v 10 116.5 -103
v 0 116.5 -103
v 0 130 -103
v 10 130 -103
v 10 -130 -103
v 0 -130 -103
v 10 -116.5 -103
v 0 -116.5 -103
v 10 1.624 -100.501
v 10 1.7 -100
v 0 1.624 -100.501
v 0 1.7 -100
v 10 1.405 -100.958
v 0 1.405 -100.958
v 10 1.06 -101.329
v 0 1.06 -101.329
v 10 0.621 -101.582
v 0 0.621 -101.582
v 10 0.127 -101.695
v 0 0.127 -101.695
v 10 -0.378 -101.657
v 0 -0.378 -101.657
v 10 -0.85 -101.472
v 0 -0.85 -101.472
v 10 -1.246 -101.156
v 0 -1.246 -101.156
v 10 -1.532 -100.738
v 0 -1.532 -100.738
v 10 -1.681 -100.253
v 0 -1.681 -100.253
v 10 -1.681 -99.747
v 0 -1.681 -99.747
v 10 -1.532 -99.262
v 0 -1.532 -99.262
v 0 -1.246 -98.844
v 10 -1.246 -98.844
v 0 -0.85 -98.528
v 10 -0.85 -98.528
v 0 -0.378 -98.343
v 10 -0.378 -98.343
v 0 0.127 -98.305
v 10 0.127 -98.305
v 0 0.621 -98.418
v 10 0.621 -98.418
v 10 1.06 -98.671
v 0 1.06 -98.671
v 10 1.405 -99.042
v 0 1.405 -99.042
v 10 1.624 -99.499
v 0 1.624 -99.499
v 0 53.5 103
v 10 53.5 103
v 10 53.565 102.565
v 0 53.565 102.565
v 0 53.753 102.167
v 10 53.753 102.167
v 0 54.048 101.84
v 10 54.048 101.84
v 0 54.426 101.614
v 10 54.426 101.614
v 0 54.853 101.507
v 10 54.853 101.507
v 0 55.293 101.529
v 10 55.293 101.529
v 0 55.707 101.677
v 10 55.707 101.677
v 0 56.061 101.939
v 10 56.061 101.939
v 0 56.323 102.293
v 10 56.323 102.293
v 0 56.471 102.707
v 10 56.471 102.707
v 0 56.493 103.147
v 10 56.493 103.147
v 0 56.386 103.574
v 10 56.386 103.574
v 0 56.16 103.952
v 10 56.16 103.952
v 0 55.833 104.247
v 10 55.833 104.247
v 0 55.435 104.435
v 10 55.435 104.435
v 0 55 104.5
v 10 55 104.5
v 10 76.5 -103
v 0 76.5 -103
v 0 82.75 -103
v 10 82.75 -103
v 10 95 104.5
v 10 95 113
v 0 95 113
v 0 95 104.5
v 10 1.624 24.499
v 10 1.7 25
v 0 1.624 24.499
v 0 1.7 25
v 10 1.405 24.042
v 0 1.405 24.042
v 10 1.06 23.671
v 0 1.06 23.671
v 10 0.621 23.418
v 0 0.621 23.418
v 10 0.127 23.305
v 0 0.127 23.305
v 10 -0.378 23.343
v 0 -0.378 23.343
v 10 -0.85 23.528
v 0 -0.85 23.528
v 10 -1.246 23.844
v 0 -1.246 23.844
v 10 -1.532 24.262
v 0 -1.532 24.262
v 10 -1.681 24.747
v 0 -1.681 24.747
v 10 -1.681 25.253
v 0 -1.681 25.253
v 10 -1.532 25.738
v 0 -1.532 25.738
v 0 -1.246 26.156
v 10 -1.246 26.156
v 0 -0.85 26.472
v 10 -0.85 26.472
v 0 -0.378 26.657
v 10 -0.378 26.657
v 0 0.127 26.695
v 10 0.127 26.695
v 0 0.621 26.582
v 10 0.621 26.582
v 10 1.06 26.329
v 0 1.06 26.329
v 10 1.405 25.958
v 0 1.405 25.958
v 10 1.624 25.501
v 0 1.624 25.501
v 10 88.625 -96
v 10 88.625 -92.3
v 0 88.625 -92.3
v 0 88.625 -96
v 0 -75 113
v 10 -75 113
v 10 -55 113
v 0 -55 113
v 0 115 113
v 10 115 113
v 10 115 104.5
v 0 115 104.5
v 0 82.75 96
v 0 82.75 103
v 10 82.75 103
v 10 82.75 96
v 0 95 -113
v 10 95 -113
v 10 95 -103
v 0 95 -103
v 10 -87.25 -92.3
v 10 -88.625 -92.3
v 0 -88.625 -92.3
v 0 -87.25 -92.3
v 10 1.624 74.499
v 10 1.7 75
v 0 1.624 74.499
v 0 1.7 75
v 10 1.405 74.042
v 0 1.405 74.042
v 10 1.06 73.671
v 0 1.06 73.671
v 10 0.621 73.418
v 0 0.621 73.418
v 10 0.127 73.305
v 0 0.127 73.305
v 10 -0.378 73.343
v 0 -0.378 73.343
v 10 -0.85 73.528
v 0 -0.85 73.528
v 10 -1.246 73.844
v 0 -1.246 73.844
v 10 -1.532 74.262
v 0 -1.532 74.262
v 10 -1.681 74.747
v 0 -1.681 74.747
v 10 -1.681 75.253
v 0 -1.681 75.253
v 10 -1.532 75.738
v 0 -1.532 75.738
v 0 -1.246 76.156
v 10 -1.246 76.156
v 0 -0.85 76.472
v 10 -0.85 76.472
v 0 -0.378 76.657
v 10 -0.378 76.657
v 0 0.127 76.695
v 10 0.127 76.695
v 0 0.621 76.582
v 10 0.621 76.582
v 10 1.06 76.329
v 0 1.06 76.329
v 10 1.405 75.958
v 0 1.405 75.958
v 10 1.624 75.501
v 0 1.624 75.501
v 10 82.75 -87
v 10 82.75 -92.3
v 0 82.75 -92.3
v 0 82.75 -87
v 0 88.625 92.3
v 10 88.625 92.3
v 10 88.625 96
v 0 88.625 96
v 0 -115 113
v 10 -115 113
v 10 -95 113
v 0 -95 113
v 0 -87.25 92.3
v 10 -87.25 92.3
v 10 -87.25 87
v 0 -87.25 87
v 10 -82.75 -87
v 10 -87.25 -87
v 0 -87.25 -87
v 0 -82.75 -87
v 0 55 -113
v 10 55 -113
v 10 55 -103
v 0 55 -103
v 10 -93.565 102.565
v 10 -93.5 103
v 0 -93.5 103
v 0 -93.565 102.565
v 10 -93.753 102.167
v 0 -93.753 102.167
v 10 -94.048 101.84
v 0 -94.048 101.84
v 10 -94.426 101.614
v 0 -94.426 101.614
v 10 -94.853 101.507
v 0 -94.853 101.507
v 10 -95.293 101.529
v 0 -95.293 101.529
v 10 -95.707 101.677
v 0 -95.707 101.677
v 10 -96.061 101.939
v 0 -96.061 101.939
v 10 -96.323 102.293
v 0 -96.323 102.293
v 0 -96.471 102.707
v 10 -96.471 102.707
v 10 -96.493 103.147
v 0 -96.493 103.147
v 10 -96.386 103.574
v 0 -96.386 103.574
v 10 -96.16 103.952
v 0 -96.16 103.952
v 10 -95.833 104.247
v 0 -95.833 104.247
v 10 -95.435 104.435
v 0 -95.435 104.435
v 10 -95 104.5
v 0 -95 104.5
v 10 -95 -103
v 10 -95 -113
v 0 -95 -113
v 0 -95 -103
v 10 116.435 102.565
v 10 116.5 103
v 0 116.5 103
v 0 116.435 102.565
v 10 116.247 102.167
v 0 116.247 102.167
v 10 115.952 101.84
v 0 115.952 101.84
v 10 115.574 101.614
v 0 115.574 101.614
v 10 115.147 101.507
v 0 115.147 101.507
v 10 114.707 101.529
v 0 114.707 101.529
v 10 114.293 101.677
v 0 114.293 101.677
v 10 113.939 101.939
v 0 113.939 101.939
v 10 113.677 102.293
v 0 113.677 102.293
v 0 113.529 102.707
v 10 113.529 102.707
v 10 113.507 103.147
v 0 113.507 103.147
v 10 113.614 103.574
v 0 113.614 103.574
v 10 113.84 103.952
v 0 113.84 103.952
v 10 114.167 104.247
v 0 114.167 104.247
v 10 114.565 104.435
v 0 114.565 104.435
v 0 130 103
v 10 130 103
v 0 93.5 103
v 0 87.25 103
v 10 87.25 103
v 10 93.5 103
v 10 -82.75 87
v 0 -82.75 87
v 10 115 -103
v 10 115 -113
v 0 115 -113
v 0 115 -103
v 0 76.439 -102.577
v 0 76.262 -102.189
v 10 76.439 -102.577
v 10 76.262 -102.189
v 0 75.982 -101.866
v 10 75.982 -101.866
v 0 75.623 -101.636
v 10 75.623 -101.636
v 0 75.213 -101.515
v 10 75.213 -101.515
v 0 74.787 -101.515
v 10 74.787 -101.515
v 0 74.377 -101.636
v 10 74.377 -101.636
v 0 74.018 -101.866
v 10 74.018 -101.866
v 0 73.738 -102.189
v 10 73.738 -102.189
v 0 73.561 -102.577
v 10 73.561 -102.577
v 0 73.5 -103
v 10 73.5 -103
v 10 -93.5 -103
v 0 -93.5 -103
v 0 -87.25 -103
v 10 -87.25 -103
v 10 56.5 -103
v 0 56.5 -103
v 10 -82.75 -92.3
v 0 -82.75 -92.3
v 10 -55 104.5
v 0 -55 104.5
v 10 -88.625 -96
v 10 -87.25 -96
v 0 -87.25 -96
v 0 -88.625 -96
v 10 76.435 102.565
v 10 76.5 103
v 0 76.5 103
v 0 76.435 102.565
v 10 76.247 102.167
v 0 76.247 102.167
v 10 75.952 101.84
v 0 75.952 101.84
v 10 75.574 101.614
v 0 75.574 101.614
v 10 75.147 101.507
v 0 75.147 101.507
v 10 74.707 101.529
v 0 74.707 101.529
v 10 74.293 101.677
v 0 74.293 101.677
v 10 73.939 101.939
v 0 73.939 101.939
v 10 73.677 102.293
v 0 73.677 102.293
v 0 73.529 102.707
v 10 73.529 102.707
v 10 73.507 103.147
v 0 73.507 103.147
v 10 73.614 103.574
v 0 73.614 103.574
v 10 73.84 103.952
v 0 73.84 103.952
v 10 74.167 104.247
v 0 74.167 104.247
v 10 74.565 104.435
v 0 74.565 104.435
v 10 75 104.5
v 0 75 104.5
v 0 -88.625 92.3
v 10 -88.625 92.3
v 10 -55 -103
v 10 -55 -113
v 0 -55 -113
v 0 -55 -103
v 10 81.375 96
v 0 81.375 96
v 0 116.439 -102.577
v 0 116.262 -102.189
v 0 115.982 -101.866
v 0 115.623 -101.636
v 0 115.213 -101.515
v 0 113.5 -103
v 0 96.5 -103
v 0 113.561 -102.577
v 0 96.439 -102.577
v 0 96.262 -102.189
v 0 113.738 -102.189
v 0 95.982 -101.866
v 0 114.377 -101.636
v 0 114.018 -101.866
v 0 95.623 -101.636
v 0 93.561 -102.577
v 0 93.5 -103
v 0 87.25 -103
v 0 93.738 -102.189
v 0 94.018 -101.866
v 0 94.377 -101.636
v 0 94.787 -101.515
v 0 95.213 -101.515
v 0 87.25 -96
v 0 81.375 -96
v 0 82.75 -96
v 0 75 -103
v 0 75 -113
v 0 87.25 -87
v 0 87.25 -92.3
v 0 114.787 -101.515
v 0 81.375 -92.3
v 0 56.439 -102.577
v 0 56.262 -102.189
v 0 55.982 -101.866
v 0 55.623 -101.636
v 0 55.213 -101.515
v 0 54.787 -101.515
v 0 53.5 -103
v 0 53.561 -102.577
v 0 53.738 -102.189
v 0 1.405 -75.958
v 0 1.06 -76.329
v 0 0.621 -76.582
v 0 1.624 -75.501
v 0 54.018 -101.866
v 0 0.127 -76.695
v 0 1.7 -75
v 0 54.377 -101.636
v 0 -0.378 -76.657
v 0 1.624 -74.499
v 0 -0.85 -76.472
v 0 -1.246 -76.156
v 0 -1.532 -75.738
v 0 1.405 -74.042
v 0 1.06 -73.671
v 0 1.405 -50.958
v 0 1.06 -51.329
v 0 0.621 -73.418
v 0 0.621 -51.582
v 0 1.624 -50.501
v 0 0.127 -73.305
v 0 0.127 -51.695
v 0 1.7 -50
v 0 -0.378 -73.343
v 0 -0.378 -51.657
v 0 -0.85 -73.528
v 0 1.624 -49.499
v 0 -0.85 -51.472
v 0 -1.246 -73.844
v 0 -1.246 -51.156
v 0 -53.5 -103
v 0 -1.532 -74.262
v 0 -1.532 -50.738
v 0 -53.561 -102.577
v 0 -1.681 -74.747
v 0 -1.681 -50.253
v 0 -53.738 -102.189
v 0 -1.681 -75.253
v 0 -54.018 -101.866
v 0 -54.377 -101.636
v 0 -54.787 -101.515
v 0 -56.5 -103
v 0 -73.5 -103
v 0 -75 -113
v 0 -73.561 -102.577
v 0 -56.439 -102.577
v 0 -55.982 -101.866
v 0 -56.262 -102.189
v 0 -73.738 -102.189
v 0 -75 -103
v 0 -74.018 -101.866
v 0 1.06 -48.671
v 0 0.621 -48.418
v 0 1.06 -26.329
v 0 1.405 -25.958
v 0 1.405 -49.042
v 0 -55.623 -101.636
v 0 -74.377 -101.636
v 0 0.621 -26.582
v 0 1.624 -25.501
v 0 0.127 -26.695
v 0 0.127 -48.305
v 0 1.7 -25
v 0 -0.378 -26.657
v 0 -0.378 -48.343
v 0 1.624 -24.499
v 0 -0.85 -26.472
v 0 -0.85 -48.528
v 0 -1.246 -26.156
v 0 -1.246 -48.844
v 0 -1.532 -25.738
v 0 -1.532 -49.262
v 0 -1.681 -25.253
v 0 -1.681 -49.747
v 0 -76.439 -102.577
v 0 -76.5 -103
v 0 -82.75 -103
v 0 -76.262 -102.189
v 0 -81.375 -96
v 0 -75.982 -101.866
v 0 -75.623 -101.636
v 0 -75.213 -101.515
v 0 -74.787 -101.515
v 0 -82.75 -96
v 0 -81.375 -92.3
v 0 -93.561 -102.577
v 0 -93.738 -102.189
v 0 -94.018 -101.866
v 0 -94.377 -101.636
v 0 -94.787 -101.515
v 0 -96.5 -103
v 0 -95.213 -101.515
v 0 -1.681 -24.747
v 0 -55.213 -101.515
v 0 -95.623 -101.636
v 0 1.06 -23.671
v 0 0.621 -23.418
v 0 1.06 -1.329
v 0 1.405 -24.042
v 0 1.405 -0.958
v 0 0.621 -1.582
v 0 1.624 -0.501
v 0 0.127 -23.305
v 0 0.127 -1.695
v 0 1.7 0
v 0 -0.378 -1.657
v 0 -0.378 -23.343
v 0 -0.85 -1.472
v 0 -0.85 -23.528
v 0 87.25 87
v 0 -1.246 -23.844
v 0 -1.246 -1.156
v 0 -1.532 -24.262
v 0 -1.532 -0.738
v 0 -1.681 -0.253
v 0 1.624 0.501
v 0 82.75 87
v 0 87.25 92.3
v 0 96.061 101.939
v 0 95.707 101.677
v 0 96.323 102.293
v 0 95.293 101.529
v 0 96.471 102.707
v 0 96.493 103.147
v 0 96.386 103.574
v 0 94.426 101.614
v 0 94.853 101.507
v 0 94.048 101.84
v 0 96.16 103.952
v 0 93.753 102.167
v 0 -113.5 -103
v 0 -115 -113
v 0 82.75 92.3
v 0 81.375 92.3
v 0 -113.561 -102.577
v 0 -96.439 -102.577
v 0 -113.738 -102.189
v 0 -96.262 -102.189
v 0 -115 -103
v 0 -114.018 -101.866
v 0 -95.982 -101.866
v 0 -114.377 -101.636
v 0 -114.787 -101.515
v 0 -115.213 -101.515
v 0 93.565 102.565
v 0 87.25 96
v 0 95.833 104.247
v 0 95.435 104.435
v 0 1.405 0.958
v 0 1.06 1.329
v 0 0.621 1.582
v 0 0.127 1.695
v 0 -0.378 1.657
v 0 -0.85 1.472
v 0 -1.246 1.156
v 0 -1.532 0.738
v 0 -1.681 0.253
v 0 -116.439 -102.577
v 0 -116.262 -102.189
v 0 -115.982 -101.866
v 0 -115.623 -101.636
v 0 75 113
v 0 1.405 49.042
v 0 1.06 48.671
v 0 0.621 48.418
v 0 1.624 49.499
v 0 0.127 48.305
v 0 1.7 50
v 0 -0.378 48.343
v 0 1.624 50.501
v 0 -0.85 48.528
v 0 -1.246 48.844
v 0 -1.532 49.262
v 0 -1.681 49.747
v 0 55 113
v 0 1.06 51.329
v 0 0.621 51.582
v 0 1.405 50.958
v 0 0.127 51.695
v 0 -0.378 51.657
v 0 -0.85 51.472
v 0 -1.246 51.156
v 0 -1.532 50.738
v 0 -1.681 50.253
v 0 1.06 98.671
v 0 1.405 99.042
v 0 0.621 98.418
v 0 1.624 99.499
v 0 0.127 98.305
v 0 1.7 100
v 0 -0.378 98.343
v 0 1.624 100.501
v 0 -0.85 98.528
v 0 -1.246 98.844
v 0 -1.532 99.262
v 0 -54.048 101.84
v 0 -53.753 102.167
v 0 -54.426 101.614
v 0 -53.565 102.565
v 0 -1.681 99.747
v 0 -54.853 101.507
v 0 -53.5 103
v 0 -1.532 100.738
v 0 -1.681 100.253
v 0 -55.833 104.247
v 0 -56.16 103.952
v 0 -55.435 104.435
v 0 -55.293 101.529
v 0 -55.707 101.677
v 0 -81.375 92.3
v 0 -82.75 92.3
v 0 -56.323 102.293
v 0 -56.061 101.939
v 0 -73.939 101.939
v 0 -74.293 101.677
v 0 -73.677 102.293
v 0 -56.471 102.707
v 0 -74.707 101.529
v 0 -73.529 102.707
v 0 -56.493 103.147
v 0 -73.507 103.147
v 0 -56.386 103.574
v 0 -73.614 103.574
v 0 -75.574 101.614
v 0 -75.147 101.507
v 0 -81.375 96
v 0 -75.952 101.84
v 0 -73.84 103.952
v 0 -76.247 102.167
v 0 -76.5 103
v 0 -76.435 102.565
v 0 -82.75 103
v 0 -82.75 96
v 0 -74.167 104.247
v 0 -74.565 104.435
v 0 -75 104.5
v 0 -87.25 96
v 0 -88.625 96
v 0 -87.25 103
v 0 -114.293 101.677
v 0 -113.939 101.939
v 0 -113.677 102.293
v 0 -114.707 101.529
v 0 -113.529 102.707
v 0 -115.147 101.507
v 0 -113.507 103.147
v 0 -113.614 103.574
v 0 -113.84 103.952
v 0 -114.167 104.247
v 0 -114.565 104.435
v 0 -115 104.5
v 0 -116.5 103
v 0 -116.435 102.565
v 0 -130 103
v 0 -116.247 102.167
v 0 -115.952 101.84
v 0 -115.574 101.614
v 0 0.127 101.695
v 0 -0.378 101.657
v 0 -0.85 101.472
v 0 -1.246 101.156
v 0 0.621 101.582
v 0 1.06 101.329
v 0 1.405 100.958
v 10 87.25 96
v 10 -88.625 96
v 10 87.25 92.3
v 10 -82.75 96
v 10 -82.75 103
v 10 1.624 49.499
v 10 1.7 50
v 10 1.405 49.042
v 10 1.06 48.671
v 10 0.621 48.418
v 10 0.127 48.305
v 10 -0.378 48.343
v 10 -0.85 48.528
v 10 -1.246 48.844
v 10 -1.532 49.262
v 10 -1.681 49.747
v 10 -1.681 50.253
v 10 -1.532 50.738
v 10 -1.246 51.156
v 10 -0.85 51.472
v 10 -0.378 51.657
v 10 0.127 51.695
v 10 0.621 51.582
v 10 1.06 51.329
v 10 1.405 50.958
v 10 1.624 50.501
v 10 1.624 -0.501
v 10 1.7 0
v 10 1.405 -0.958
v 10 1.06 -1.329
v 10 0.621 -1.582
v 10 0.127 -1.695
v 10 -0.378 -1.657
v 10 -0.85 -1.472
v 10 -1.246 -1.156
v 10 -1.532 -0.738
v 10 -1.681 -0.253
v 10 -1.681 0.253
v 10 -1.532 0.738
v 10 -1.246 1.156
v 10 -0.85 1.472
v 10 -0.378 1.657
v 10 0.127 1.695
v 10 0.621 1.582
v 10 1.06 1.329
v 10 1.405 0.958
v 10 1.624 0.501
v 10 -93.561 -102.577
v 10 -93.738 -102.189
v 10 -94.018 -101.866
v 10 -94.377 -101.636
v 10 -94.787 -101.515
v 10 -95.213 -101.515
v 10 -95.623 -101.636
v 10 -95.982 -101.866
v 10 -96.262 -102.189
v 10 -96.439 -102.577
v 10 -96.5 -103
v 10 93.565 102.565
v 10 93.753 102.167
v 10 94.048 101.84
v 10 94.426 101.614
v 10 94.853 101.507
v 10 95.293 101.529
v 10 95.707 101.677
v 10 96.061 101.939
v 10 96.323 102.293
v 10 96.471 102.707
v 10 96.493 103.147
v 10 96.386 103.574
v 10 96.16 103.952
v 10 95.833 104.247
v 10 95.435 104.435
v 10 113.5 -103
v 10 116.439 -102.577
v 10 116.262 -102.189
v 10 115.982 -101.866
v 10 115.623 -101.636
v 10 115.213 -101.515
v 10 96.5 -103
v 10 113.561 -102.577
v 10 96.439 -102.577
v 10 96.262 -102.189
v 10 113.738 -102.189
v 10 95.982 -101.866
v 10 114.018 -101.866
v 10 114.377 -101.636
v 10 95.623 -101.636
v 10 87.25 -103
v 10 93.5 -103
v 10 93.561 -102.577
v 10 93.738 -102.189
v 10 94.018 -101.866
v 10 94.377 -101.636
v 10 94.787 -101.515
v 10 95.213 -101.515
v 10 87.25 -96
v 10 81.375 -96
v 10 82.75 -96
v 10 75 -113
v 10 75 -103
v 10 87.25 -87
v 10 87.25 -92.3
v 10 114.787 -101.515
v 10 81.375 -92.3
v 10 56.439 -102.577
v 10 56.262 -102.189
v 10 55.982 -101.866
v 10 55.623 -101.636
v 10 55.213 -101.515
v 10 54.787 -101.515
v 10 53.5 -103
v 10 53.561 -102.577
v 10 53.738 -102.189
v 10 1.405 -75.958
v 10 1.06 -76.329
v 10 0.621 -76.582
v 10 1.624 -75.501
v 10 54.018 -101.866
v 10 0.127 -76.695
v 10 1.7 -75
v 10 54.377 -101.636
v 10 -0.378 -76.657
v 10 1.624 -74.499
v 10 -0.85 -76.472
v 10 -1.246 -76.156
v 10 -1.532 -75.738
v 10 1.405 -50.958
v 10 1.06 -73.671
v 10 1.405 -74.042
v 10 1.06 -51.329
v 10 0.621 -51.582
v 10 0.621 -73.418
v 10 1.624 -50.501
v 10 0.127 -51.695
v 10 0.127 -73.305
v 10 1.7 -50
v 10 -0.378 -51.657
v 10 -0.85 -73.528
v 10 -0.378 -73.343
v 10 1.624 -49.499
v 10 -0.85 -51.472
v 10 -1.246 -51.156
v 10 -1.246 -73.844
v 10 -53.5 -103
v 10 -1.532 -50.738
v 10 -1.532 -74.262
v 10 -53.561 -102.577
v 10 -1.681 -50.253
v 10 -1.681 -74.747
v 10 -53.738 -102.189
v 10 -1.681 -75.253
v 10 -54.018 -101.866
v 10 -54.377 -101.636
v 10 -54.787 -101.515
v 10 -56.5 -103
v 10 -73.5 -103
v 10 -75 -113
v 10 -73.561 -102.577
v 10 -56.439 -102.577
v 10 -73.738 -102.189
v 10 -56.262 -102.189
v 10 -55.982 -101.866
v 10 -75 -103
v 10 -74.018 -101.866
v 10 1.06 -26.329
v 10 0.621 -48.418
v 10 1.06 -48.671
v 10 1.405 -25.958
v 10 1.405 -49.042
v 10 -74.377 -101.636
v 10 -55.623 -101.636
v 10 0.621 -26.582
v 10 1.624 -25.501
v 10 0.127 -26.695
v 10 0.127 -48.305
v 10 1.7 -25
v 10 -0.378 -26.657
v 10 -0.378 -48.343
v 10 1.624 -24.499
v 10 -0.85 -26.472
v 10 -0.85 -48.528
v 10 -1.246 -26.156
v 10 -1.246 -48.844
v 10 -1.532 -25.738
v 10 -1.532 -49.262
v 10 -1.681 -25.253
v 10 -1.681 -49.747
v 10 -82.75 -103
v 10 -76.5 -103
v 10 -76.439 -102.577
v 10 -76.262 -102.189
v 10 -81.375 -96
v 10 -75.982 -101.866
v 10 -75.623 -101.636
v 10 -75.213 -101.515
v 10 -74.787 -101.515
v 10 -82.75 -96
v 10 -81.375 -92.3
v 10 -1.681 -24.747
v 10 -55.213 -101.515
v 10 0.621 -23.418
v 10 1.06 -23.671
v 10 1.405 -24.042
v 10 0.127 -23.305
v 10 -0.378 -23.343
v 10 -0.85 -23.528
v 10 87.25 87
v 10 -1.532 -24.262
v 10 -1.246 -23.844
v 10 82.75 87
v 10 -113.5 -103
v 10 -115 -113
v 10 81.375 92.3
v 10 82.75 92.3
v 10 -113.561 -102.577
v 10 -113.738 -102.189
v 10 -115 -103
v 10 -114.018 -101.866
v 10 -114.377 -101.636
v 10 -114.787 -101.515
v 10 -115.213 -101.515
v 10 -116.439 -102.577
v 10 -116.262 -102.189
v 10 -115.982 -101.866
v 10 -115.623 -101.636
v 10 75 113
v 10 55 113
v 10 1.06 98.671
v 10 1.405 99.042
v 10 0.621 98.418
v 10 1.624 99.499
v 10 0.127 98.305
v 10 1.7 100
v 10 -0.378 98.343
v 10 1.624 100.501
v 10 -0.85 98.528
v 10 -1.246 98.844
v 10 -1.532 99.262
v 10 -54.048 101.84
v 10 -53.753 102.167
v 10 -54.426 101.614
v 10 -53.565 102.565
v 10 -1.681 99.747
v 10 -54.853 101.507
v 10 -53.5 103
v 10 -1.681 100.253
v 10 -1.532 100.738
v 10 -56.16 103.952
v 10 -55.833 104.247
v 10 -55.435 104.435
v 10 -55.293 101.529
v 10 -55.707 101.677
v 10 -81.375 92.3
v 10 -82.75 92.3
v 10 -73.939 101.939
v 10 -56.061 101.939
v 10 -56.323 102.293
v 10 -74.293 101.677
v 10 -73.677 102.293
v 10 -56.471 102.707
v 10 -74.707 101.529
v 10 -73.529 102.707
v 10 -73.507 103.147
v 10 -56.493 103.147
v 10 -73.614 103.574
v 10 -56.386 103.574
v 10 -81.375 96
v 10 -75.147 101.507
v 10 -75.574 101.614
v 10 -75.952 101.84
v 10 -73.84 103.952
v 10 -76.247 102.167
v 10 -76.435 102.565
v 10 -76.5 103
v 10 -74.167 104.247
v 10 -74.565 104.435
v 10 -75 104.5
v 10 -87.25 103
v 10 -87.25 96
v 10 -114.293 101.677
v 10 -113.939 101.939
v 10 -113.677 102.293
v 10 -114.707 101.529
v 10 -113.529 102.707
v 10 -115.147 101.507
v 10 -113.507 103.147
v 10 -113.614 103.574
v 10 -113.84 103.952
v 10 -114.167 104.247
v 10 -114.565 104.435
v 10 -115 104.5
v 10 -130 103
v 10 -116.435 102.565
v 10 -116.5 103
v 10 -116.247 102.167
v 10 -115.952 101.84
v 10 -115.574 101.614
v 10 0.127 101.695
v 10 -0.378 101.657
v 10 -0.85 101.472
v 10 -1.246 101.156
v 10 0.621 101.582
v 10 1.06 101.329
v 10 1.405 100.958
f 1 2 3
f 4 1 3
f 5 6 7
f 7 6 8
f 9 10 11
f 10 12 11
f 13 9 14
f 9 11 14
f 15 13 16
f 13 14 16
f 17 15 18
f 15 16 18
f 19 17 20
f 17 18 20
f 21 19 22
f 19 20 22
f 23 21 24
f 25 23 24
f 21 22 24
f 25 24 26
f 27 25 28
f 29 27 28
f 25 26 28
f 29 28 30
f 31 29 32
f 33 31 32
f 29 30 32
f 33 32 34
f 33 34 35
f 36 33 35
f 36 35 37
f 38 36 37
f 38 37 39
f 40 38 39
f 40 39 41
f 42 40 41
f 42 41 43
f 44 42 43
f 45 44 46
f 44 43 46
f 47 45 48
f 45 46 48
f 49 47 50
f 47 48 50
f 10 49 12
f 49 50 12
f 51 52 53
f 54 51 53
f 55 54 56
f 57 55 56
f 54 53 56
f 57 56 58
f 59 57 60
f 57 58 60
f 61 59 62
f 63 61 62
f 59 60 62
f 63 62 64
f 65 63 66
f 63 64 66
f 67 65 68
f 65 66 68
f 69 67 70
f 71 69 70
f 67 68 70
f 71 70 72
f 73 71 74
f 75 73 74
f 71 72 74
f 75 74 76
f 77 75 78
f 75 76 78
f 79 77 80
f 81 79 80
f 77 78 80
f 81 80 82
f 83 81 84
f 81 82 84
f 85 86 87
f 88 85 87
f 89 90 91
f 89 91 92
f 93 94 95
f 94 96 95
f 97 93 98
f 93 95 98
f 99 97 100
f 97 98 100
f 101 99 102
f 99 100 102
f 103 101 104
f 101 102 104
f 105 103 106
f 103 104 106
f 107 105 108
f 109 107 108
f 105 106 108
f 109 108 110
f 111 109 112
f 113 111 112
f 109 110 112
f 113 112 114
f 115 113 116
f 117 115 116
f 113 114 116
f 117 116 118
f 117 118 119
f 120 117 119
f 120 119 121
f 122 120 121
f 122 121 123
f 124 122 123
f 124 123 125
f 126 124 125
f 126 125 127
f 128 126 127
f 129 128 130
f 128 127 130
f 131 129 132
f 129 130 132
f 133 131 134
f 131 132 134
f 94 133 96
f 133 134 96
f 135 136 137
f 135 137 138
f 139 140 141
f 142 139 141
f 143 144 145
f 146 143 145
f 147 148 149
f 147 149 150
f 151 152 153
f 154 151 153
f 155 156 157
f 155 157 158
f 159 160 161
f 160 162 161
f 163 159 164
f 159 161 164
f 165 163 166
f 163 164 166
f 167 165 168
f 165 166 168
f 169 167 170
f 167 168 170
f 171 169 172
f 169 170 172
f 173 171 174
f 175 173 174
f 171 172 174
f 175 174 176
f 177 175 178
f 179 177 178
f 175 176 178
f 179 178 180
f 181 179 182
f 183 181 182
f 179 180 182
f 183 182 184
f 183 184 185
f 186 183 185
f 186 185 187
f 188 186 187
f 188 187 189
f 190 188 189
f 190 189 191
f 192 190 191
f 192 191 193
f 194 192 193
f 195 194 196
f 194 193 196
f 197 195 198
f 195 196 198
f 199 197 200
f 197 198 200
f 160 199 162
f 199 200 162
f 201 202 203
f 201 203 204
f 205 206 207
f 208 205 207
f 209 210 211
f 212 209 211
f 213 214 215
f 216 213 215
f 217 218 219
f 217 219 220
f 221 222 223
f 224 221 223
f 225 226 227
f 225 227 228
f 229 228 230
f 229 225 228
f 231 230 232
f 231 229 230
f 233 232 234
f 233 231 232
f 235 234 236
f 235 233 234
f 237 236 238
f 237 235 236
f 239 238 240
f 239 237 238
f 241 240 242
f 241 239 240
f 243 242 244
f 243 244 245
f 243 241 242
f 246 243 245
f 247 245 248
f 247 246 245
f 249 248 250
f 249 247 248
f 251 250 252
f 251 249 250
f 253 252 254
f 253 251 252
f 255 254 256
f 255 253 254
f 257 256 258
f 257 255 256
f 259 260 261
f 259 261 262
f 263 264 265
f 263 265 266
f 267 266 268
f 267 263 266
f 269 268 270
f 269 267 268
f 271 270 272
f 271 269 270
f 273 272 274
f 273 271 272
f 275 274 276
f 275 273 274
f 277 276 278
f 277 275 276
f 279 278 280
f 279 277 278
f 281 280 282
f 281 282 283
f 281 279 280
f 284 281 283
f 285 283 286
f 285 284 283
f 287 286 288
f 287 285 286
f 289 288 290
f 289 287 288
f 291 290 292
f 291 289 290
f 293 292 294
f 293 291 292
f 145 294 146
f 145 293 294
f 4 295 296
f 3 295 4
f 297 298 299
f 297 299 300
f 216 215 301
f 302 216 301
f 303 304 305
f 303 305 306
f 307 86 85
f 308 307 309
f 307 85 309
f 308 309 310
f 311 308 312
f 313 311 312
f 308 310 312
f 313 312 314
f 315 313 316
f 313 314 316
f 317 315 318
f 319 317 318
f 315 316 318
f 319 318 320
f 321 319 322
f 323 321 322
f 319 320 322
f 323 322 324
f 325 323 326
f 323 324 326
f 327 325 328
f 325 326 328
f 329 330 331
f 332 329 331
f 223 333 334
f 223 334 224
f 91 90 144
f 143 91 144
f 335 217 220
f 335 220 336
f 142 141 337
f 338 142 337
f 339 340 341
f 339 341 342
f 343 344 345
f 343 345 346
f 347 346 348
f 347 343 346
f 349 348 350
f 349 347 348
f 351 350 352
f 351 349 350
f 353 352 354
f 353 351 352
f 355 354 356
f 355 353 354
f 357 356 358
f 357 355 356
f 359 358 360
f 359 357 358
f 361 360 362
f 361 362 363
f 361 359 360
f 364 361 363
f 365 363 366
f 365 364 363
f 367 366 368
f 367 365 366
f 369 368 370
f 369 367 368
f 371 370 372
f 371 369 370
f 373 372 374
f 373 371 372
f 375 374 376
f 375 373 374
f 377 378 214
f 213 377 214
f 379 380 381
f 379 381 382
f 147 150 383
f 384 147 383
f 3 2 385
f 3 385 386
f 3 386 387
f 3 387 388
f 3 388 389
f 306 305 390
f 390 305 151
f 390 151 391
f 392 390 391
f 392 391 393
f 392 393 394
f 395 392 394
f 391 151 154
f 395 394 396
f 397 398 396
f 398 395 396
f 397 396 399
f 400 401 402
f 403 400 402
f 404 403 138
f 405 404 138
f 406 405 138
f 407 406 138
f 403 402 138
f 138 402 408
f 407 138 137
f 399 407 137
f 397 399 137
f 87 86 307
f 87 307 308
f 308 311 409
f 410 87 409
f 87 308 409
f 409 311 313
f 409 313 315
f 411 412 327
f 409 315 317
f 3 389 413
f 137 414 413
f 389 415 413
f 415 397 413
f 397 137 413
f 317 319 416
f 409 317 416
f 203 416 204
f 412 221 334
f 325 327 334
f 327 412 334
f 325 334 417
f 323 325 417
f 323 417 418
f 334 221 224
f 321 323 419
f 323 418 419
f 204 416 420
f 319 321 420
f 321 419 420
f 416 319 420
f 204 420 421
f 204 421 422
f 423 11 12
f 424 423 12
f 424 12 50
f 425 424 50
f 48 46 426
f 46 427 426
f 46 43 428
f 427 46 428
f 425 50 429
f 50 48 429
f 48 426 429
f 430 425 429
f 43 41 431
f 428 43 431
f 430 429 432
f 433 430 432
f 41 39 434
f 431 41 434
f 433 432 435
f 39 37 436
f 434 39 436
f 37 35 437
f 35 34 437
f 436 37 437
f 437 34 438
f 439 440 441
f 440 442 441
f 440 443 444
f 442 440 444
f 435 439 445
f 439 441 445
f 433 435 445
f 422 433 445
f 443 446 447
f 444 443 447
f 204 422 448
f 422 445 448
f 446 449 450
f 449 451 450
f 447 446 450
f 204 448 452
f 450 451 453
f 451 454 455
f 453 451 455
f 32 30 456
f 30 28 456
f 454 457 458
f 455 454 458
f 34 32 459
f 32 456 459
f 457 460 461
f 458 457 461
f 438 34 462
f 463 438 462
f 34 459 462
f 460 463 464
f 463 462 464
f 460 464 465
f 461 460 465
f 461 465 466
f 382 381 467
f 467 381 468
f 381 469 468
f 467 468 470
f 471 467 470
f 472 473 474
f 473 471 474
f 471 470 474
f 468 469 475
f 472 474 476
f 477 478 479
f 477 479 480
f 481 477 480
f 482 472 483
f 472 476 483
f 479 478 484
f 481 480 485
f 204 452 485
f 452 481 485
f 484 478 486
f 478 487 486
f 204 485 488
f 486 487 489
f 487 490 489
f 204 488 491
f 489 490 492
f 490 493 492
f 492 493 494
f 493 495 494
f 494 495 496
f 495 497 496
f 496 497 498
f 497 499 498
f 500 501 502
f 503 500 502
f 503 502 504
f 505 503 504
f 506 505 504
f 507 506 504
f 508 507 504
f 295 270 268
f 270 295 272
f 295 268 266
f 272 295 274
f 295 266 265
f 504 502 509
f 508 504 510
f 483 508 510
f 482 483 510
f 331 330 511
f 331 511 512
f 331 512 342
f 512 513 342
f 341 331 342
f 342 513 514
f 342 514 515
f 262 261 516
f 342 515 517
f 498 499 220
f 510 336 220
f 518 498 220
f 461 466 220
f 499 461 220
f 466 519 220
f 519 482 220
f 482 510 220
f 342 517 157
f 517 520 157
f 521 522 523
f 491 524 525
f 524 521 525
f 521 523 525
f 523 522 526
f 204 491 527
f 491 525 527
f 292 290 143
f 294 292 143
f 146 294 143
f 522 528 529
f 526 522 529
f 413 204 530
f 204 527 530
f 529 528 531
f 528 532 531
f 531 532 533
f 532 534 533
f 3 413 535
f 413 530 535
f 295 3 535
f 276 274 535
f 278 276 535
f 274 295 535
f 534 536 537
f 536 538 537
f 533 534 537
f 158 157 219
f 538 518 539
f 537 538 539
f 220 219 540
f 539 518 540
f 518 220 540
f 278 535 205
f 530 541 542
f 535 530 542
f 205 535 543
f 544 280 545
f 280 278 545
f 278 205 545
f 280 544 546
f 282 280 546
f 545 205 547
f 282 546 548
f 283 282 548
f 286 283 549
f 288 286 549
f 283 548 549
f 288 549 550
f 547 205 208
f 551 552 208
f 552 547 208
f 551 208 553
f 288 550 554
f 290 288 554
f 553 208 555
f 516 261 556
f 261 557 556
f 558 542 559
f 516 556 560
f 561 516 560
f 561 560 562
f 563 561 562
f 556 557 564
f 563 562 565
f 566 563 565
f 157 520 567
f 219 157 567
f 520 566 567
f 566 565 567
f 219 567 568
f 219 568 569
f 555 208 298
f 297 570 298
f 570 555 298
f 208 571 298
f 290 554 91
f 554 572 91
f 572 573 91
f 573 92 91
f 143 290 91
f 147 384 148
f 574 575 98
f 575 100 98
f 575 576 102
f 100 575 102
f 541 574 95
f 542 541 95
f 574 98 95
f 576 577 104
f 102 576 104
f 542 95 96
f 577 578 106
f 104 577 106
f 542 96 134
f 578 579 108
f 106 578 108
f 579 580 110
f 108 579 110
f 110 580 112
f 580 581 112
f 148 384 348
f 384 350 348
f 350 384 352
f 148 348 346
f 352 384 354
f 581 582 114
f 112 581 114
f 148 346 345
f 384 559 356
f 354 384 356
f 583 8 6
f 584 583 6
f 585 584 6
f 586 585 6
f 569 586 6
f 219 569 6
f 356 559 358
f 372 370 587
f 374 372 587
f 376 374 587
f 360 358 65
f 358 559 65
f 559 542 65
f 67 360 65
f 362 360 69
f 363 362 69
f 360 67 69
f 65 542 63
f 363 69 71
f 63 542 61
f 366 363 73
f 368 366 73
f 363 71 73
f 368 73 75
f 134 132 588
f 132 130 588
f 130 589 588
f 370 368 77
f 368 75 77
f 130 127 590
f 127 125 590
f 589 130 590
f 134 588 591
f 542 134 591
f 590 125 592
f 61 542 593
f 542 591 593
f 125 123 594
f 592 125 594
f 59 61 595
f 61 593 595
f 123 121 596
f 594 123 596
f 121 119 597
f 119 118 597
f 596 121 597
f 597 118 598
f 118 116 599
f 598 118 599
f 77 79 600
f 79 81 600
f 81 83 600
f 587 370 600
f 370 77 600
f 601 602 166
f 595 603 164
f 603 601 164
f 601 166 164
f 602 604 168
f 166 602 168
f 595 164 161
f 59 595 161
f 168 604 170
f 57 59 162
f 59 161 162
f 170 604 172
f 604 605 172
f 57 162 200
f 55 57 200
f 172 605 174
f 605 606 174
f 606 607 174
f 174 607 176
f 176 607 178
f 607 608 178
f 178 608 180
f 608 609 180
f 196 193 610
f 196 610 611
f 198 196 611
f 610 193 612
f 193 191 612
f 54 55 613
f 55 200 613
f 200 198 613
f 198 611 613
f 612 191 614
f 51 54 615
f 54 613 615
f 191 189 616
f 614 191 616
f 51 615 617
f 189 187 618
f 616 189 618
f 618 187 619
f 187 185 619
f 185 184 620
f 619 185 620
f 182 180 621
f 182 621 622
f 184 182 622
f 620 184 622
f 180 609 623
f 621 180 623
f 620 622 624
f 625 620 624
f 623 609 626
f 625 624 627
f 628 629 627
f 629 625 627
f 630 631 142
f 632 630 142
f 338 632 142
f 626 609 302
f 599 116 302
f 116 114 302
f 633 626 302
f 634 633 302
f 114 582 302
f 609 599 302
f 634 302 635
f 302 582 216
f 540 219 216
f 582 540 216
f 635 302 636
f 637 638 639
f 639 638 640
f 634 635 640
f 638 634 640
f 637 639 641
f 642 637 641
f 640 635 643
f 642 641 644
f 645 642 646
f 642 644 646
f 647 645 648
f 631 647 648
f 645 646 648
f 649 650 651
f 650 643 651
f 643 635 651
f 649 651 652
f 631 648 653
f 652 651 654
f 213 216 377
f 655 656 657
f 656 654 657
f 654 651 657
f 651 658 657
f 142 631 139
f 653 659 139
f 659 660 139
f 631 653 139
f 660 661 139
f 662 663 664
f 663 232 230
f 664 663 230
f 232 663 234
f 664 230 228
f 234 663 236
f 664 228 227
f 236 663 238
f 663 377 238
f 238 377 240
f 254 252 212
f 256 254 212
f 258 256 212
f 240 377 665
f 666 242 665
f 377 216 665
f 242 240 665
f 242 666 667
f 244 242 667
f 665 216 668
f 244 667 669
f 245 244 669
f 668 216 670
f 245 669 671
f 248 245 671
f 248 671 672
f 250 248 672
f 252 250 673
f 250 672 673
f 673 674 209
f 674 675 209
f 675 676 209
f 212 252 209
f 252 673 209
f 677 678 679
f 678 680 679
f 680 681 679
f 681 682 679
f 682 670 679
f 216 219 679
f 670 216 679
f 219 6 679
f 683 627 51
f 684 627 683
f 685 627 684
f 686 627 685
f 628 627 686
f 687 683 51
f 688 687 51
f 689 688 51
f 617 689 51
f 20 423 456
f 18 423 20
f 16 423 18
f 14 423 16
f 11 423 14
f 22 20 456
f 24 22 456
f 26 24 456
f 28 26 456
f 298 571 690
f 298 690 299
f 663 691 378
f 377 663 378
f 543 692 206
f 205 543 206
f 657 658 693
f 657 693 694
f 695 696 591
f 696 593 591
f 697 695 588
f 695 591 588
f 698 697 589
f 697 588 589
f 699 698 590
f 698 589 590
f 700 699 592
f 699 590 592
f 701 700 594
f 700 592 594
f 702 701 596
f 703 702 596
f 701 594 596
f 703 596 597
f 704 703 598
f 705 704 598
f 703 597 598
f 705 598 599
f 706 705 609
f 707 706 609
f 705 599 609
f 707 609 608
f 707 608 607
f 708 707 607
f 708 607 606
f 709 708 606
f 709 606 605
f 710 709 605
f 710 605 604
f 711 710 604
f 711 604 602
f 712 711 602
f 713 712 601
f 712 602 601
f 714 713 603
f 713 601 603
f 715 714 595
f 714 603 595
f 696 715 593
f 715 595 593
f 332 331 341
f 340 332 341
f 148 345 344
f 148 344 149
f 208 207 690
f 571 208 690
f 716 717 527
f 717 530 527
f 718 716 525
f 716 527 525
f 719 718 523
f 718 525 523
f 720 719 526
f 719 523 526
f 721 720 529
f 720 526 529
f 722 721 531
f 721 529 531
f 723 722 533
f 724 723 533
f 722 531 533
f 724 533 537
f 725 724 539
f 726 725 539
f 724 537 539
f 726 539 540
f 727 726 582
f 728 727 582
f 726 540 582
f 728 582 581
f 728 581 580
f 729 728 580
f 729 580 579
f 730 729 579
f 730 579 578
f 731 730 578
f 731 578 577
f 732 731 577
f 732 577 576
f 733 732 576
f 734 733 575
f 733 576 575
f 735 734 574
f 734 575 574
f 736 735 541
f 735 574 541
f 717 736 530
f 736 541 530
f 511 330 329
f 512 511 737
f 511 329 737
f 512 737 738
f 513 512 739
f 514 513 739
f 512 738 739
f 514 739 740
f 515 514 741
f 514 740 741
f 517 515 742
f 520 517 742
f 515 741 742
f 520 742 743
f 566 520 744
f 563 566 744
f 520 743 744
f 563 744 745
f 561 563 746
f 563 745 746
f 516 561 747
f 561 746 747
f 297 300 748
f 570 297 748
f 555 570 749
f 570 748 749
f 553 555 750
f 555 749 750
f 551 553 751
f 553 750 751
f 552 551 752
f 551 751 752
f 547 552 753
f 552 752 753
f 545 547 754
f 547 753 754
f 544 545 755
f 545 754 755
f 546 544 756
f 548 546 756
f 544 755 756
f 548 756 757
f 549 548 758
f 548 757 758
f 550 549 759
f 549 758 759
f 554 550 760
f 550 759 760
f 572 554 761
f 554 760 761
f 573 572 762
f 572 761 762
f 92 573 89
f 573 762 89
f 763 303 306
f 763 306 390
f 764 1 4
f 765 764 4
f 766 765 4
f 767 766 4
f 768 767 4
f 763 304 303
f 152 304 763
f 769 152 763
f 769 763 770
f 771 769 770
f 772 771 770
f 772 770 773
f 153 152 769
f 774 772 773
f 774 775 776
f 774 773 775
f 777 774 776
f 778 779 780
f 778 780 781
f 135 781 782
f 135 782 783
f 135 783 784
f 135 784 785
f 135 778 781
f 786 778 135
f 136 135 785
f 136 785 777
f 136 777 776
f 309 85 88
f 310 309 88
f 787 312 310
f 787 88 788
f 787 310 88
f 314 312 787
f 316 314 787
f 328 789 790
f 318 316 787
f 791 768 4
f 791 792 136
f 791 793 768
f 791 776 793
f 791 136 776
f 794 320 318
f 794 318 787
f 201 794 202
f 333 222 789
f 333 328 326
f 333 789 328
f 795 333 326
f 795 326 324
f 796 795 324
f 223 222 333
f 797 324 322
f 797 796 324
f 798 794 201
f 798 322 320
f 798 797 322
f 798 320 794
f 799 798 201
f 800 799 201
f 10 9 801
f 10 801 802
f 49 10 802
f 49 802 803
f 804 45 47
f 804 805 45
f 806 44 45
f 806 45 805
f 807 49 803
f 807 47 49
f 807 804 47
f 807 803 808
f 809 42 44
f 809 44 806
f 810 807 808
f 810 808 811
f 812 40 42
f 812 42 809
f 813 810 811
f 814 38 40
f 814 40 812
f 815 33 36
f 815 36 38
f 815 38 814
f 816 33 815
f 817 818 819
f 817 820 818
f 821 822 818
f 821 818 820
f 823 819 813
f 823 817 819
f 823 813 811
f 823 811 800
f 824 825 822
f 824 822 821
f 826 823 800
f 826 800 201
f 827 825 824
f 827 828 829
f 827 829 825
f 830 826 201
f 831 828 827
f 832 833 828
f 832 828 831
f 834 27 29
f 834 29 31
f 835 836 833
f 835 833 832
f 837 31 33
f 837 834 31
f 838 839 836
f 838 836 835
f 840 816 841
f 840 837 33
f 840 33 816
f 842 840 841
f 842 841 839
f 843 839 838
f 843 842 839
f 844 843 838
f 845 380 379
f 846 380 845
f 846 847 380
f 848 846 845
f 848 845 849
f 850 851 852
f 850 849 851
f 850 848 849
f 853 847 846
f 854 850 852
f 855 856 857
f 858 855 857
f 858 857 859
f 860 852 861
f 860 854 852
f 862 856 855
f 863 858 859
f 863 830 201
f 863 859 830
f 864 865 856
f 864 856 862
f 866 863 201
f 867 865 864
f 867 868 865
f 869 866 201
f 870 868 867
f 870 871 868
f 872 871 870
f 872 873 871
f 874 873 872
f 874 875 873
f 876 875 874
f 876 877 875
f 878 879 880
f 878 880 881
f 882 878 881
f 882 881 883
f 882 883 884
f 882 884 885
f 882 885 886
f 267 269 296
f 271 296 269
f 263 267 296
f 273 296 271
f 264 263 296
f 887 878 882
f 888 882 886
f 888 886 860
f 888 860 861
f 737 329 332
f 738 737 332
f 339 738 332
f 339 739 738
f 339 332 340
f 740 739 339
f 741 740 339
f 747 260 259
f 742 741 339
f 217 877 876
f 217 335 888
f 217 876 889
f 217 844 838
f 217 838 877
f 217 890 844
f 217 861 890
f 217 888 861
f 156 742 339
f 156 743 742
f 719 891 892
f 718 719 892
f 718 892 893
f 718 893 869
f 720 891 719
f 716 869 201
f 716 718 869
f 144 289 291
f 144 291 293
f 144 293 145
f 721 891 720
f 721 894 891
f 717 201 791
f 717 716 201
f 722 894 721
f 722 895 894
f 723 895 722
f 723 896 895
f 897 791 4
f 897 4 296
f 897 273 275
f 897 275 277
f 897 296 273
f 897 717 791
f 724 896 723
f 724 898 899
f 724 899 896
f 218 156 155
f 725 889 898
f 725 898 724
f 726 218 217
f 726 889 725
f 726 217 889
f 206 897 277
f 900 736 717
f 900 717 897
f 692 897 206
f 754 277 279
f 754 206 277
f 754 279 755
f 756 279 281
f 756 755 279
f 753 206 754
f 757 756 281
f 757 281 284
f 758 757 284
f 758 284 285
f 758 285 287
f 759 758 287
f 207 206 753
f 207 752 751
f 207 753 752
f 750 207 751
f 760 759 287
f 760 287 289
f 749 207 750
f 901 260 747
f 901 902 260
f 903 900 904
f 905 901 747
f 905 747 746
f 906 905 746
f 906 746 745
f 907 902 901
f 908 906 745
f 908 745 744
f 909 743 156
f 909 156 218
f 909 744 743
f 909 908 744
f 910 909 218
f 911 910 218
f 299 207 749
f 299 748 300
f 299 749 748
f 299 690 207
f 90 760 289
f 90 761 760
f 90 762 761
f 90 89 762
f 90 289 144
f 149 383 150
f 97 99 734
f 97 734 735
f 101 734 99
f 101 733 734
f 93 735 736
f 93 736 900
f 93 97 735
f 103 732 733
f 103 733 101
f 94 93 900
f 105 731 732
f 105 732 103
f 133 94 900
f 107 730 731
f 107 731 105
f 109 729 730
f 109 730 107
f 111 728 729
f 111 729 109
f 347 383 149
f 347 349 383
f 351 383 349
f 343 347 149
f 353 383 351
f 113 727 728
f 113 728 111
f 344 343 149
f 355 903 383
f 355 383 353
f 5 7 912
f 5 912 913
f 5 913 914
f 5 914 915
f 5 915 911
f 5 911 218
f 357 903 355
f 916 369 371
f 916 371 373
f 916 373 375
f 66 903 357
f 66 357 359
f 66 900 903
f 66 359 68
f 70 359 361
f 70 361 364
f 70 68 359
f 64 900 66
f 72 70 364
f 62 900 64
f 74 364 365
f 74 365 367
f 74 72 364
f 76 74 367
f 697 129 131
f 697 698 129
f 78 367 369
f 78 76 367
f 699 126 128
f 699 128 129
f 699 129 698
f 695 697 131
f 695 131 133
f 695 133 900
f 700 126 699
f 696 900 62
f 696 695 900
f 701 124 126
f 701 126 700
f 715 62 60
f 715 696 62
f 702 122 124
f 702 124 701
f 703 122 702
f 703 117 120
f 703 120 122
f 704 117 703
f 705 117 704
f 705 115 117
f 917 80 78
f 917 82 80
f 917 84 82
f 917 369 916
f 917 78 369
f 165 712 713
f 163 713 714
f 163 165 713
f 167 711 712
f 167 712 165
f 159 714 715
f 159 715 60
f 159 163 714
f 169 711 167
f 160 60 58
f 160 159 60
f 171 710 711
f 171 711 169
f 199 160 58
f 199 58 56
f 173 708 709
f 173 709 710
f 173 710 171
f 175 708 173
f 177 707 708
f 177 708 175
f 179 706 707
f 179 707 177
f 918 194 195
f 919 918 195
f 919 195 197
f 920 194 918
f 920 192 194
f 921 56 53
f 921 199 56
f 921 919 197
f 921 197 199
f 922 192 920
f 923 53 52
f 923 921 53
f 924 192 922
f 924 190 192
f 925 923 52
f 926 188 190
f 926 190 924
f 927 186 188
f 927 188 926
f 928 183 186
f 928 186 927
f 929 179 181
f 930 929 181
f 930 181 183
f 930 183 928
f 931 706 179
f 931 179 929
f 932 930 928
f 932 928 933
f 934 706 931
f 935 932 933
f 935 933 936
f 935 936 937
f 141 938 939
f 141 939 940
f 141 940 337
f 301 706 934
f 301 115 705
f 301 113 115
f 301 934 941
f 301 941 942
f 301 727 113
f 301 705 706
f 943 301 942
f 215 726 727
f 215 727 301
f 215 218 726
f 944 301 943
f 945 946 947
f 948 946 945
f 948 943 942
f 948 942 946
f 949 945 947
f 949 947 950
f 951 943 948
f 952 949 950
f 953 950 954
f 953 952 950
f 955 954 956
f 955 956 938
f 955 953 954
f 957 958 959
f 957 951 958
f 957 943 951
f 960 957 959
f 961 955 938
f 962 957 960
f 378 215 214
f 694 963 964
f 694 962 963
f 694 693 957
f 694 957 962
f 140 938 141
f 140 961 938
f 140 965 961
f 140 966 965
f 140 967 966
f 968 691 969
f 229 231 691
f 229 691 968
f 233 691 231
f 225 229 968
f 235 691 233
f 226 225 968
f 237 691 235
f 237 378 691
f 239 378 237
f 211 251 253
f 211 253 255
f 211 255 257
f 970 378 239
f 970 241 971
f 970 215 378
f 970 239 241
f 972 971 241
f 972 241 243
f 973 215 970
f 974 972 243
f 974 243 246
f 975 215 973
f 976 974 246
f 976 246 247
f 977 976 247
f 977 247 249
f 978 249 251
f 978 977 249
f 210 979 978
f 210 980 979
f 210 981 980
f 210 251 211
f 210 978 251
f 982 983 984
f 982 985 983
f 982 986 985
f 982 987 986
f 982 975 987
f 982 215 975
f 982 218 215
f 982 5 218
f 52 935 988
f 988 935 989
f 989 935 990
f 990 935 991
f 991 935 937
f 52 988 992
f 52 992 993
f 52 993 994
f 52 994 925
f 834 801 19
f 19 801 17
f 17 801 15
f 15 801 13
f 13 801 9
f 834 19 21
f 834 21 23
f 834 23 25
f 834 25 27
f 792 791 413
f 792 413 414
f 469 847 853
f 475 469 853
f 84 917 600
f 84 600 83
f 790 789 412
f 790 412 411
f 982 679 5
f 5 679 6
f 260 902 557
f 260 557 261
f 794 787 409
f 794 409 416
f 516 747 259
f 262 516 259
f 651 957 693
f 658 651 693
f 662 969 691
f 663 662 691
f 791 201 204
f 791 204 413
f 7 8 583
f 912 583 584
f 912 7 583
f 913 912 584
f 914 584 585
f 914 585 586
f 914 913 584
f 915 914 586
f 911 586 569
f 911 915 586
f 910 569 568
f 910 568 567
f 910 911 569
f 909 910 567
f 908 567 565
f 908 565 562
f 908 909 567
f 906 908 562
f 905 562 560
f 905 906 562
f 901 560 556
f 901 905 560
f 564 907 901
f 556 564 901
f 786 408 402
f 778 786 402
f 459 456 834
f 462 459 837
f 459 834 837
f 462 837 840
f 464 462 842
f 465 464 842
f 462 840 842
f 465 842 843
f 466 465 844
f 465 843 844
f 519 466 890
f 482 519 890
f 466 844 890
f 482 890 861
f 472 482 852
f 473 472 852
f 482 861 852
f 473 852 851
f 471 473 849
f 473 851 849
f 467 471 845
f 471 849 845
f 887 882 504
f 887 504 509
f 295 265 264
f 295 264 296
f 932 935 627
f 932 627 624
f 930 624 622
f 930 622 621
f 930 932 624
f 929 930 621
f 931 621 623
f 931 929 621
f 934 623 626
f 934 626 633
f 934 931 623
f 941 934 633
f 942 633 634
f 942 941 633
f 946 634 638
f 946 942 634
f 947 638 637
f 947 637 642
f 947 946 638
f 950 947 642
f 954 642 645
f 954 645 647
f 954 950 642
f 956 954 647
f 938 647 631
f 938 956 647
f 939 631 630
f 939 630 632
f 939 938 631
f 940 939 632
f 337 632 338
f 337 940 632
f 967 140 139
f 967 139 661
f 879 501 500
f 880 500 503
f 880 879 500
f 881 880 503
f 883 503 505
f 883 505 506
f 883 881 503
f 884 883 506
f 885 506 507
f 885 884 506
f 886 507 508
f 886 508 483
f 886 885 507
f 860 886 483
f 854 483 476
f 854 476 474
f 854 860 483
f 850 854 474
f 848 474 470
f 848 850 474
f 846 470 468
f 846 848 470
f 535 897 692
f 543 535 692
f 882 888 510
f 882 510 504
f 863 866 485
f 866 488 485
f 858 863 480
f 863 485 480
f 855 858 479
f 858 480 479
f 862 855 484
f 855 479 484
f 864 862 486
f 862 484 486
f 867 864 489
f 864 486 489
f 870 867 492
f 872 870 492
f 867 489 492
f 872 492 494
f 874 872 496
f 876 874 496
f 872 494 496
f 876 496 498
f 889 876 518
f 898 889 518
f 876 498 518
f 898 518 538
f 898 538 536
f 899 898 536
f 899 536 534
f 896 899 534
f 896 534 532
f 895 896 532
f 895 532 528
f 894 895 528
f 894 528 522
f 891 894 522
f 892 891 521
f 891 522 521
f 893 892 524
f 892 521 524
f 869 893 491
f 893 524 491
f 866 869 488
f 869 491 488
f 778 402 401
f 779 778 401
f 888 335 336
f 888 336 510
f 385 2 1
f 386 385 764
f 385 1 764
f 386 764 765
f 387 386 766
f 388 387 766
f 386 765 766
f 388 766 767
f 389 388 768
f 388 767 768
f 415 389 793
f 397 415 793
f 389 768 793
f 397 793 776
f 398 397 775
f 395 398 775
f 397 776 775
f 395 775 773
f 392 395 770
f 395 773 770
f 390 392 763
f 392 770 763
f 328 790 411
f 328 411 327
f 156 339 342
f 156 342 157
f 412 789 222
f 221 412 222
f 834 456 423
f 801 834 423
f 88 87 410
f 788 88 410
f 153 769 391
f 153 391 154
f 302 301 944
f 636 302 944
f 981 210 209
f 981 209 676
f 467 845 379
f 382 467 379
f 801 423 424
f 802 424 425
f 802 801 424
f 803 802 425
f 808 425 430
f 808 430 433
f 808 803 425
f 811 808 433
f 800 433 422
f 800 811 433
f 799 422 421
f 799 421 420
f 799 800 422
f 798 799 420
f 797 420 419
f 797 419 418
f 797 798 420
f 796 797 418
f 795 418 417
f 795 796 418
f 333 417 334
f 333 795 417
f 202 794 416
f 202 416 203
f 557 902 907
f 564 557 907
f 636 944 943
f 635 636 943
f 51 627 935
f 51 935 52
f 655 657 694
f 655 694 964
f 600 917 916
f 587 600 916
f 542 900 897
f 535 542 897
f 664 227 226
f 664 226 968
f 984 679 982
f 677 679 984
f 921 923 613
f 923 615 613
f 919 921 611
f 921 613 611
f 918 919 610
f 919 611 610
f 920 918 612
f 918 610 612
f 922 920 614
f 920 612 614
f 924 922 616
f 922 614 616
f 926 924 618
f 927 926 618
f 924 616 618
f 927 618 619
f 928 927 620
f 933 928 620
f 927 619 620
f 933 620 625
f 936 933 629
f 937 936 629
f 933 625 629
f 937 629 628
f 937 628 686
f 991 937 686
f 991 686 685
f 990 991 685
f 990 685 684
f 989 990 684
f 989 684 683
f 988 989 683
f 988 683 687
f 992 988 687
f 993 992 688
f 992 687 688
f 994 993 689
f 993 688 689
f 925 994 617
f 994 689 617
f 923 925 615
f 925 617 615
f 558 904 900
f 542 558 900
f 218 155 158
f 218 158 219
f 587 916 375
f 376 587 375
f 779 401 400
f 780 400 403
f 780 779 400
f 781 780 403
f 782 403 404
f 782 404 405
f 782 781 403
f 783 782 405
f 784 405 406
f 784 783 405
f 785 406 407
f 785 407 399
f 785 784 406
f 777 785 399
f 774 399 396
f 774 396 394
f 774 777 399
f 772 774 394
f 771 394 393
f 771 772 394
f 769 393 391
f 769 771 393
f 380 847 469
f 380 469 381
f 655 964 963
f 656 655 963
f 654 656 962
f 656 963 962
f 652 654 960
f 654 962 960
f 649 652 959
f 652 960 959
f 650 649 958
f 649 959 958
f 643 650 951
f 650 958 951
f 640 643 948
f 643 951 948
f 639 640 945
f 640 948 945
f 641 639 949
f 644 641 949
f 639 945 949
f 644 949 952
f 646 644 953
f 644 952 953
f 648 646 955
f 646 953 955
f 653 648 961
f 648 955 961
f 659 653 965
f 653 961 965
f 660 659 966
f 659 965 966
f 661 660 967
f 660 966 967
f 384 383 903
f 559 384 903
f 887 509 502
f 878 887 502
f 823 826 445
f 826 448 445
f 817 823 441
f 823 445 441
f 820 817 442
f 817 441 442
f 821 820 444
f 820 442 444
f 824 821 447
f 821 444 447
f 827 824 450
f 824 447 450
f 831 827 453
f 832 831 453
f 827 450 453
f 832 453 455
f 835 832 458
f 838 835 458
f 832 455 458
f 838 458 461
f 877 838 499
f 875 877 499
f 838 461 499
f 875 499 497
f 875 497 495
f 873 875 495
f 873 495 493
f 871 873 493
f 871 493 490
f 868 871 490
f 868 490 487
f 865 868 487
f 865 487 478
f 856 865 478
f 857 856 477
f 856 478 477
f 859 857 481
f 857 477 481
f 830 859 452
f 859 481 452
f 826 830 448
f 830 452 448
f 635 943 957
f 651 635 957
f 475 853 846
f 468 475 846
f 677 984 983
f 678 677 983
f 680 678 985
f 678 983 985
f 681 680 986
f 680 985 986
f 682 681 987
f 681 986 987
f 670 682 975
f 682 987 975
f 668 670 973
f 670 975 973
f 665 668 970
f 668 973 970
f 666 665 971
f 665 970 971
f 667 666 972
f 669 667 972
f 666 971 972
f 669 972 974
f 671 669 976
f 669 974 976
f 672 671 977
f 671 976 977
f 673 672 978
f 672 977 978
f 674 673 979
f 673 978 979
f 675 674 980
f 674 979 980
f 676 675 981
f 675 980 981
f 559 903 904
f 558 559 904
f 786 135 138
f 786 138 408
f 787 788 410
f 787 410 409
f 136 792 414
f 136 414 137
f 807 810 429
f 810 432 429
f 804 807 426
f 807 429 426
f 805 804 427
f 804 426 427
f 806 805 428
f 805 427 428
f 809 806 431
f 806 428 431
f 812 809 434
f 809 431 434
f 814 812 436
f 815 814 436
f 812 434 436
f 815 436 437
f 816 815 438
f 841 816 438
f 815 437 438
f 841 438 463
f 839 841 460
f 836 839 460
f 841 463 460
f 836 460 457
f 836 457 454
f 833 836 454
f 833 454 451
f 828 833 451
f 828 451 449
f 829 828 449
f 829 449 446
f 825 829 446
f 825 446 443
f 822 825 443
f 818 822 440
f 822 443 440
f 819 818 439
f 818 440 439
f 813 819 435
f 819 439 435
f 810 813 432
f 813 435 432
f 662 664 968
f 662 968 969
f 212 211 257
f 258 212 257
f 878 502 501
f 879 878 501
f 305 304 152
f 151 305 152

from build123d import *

# Parameters (mm, degrees)
SKETCH1_W                = 206
SKETCH1_H                = 260
EXTRUDE1_DEPTH           = 10
SKETCH3_W                = 10
SKETCH3_H                = 20
EXTRUDE2_DEPTH           = 10
LPATTERN1_COUNT          = 2
LPATTERN1_PITCH          = 196
LPATTERN1_COUNT_DIR2     = 2
LPATTERN1_PITCH_DIR2     = 170
EXTRUDE4_DEPTH           = 10
LPATTERN2_COUNT          = 2
LPATTERN2_PITCH          = 170
LPATTERN2_COPY_1_DEPTH   = 10
EXTRUDE5_DEPTH           = 10
MIRROR3_COPY_1_DEPTH     = 10
M3_CLEARANCE_HOLE1_D     = 3.4
M3_CLEARANCE_HOLE1_DEPTH = 10
M3_CLEARANCE_HOLE1_TIP   = 1.021463052
MIRROR4_COPY_1_SKETCH_W  = 10
MIRROR4_COPY_1_SKETCH_H  = 20
MIRROR4_COPY_1_DEPTH     = 10


with BuildPart() as part:
    # Sketch1 → Extrude1 (new body)
    with BuildSketch(Plane(origin=(0, 0, 0), x_dir=(0, 0, -1), z_dir=(1, 0, 0))):
        Rectangle(SKETCH1_W, SKETCH1_H)
    extrude(amount=EXTRUDE1_DEPTH)

    # Sketch3 → Extrude2 (add)
    with BuildSketch(Plane(origin=(10, 0, 0), x_dir=(0, 0, -1), z_dir=(1, 0, 0))):
        with Locations((-108, -105)):
            Rectangle(SKETCH3_W, SKETCH3_H)
        with Locations((-108, -65)):
            Rectangle(SKETCH3_W, SKETCH3_H)
    extrude2 = extrude(amount=-EXTRUDE2_DEPTH)

    # LPattern1: Extrude2 2 × 2, 2 skipped
    with Locations(*[(i * LPATTERN1_PITCH, j * LPATTERN1_PITCH_DIR2, 0) for i in range(LPATTERN1_COUNT) for j in range(LPATTERN1_COUNT_DIR2) if (i, j) not in ((0, 0), (1, 0), (1, 1))]):
        add(extrude2)

    # Sketch5 → Extrude4 (cut)
    with BuildSketch(Plane(origin=(10, 0, 0), x_dir=(0, 0, -1), z_dir=(1, 0, 0))):
        Polygon((-103, -87.25), (-96, -87.25), (-96, -88.625), (-92.3, -88.625), (-92.3, -87.25), (-87, -87.25), (-87, -82.75), (-92.3, -82.75), (-92.3, -81.375), (-96, -81.375), (-96, -82.75), (-103, -82.75), align=None)
    extrude4 = extrude(amount=-EXTRUDE4_DEPTH, mode=Mode.SUBTRACT)

    # Mirror1: Extrude4 across plane
    add(extrude4.mirror(Plane(origin=(0, 0, 0), x_dir=(1, 0, 0), z_dir=(0, 0, -1))), mode=Mode.SUBTRACT)

    # LPattern2: Extrude4 ×2
    with Locations(*[(0, i * LPATTERN2_PITCH, 0) for i in range(1, LPATTERN2_COUNT)]):
        add(extrude4, mode=Mode.SUBTRACT)

    # LPattern2 copy 1 sketch → LPattern2 copy 1 (cut)
    with BuildSketch(Plane(origin=(10, 170, 0), x_dir=(0, 0, 1), z_dir=(1, 0, 0))):
        Polygon((-103, 87.25), (-96, 87.25), (-96, 88.625), (-92.3, 88.625), (-92.3, 87.25), (-87, 87.25), (-87, 82.75), (-92.3, 82.75), (-92.3, 81.375), (-96, 81.375), (-96, 82.75), (-103, 82.75), align=None)
    extrude(amount=-LPATTERN2_COPY_1_DEPTH, mode=Mode.SUBTRACT)

    # Sketch6 → Extrude5 (cut)
    with BuildSketch(Plane(origin=(10, 0, 0), x_dir=(0, 0, -1), z_dir=(1, 0, 0))):
        with BuildLine():
            Line((-104.5, -115), (-103, -115))
            Line((-103, -115), (-103, -116.5))
            ThreePointArc((-103, -116.5), (-101.939339828, -113.939339828), (-104.5, -115))
        make_face()
        with BuildLine():
            Line((-104.5, -55), (-103, -55))
            Line((-103, -55), (-103, -53.5))
            ThreePointArc((-103, -53.5), (-101.939339828, -56.060660172), (-104.5, -55))
        make_face()
        with BuildLine():
            Line((-104.5, -95), (-103, -95))
            Line((-103, -95), (-103, -93.5))
            ThreePointArc((-103, -93.5), (-101.939339828, -96.060660172), (-104.5, -95))
        make_face()
        with BuildLine():
            Line((-104.5, -75), (-103, -75))
            Line((-103, -75), (-103, -76.5))
            ThreePointArc((-103, -76.5), (-101.939339828, -73.939339828), (-104.5, -75))
        make_face()
    extrude5 = extrude(amount=-EXTRUDE5_DEPTH, mode=Mode.SUBTRACT)

    # Mirror2: Extrude5 across plane
    add(extrude5.mirror(Plane(origin=(0, 0, 0), x_dir=(1, 0, 0), z_dir=(0, 0, -1))), mode=Mode.SUBTRACT)

    # Mirror3: Extrude5 across plane
    add(extrude5.mirror(Plane.ZX), mode=Mode.SUBTRACT)

    # Mirror3 copy 1 sketch → Mirror3 copy 1 (cut)
    with BuildSketch(Plane(origin=(10, 0, 0), x_dir=(0, 0, 1), z_dir=(1, 0, 0))):
        with BuildLine():
            Line((-104.5, -115), (-103, -115))
            Line((-103, -115), (-103, -116.5))
            ThreePointArc((-103, -116.5), (-101.939339828, -113.939339828), (-104.5, -115))
        make_face()
        with BuildLine():
            Line((-104.5, -55), (-103, -55))
            Line((-103, -55), (-103, -53.5))
            ThreePointArc((-103, -53.5), (-101.939339828, -56.060660172), (-104.5, -55))
        make_face()
        with BuildLine():
            Line((-104.5, -95), (-103, -95))
            Line((-103, -95), (-103, -93.5))
            ThreePointArc((-103, -93.5), (-101.939339828, -96.060660172), (-104.5, -95))
        make_face()
        with BuildLine():
            Line((-104.5, -75), (-103, -75))
            Line((-103, -75), (-103, -76.5))
            ThreePointArc((-103, -76.5), (-101.939339828, -73.939339828), (-104.5, -75))
        make_face()
    extrude(amount=-MIRROR3_COPY_1_DEPTH, mode=Mode.SUBTRACT)

    # M3 Clearance Hole1
    with Locations(Plane(origin=(10, -130, 293), x_dir=(0, -1, 0), z_dir=(1, 0, 0))):
        with Locations((-130, 368), (-130, 343), (-130, 318), (-130, 293), (-130, 268), (-130, 243), (-130, 218), (-130, 193), (-130, 393)):
            Hole(M3_CLEARANCE_HOLE1_D / 2, depth=M3_CLEARANCE_HOLE1_DEPTH)
            with Locations((0, 0, -(M3_CLEARANCE_HOLE1_DEPTH + M3_CLEARANCE_HOLE1_TIP / 2))):  # 118° drill point
                Cone(0, M3_CLEARANCE_HOLE1_D / 2, M3_CLEARANCE_HOLE1_TIP, mode=Mode.SUBTRACT)

    # Mirror4: Extrude2 across plane
    add(extrude2.mirror(Plane(origin=(0, 0, 0), x_dir=(1, 0, 0), z_dir=(0, 0, -1))))

    # Mirror4 copy 1 sketch → Mirror4 copy 1 (add)
    with BuildSketch(Plane(origin=(10, 170, 0), x_dir=(0, 0, 1), z_dir=(1, 0, 0))):
        with Locations((-108, 105)):
            Rectangle(MIRROR4_COPY_1_SKETCH_W, MIRROR4_COPY_1_SKETCH_H)
        with Locations((-108, 65)):
            Rectangle(MIRROR4_COPY_1_SKETCH_W, MIRROR4_COPY_1_SKETCH_H)
    extrude(amount=-MIRROR4_COPY_1_DEPTH)


solid = part.part
